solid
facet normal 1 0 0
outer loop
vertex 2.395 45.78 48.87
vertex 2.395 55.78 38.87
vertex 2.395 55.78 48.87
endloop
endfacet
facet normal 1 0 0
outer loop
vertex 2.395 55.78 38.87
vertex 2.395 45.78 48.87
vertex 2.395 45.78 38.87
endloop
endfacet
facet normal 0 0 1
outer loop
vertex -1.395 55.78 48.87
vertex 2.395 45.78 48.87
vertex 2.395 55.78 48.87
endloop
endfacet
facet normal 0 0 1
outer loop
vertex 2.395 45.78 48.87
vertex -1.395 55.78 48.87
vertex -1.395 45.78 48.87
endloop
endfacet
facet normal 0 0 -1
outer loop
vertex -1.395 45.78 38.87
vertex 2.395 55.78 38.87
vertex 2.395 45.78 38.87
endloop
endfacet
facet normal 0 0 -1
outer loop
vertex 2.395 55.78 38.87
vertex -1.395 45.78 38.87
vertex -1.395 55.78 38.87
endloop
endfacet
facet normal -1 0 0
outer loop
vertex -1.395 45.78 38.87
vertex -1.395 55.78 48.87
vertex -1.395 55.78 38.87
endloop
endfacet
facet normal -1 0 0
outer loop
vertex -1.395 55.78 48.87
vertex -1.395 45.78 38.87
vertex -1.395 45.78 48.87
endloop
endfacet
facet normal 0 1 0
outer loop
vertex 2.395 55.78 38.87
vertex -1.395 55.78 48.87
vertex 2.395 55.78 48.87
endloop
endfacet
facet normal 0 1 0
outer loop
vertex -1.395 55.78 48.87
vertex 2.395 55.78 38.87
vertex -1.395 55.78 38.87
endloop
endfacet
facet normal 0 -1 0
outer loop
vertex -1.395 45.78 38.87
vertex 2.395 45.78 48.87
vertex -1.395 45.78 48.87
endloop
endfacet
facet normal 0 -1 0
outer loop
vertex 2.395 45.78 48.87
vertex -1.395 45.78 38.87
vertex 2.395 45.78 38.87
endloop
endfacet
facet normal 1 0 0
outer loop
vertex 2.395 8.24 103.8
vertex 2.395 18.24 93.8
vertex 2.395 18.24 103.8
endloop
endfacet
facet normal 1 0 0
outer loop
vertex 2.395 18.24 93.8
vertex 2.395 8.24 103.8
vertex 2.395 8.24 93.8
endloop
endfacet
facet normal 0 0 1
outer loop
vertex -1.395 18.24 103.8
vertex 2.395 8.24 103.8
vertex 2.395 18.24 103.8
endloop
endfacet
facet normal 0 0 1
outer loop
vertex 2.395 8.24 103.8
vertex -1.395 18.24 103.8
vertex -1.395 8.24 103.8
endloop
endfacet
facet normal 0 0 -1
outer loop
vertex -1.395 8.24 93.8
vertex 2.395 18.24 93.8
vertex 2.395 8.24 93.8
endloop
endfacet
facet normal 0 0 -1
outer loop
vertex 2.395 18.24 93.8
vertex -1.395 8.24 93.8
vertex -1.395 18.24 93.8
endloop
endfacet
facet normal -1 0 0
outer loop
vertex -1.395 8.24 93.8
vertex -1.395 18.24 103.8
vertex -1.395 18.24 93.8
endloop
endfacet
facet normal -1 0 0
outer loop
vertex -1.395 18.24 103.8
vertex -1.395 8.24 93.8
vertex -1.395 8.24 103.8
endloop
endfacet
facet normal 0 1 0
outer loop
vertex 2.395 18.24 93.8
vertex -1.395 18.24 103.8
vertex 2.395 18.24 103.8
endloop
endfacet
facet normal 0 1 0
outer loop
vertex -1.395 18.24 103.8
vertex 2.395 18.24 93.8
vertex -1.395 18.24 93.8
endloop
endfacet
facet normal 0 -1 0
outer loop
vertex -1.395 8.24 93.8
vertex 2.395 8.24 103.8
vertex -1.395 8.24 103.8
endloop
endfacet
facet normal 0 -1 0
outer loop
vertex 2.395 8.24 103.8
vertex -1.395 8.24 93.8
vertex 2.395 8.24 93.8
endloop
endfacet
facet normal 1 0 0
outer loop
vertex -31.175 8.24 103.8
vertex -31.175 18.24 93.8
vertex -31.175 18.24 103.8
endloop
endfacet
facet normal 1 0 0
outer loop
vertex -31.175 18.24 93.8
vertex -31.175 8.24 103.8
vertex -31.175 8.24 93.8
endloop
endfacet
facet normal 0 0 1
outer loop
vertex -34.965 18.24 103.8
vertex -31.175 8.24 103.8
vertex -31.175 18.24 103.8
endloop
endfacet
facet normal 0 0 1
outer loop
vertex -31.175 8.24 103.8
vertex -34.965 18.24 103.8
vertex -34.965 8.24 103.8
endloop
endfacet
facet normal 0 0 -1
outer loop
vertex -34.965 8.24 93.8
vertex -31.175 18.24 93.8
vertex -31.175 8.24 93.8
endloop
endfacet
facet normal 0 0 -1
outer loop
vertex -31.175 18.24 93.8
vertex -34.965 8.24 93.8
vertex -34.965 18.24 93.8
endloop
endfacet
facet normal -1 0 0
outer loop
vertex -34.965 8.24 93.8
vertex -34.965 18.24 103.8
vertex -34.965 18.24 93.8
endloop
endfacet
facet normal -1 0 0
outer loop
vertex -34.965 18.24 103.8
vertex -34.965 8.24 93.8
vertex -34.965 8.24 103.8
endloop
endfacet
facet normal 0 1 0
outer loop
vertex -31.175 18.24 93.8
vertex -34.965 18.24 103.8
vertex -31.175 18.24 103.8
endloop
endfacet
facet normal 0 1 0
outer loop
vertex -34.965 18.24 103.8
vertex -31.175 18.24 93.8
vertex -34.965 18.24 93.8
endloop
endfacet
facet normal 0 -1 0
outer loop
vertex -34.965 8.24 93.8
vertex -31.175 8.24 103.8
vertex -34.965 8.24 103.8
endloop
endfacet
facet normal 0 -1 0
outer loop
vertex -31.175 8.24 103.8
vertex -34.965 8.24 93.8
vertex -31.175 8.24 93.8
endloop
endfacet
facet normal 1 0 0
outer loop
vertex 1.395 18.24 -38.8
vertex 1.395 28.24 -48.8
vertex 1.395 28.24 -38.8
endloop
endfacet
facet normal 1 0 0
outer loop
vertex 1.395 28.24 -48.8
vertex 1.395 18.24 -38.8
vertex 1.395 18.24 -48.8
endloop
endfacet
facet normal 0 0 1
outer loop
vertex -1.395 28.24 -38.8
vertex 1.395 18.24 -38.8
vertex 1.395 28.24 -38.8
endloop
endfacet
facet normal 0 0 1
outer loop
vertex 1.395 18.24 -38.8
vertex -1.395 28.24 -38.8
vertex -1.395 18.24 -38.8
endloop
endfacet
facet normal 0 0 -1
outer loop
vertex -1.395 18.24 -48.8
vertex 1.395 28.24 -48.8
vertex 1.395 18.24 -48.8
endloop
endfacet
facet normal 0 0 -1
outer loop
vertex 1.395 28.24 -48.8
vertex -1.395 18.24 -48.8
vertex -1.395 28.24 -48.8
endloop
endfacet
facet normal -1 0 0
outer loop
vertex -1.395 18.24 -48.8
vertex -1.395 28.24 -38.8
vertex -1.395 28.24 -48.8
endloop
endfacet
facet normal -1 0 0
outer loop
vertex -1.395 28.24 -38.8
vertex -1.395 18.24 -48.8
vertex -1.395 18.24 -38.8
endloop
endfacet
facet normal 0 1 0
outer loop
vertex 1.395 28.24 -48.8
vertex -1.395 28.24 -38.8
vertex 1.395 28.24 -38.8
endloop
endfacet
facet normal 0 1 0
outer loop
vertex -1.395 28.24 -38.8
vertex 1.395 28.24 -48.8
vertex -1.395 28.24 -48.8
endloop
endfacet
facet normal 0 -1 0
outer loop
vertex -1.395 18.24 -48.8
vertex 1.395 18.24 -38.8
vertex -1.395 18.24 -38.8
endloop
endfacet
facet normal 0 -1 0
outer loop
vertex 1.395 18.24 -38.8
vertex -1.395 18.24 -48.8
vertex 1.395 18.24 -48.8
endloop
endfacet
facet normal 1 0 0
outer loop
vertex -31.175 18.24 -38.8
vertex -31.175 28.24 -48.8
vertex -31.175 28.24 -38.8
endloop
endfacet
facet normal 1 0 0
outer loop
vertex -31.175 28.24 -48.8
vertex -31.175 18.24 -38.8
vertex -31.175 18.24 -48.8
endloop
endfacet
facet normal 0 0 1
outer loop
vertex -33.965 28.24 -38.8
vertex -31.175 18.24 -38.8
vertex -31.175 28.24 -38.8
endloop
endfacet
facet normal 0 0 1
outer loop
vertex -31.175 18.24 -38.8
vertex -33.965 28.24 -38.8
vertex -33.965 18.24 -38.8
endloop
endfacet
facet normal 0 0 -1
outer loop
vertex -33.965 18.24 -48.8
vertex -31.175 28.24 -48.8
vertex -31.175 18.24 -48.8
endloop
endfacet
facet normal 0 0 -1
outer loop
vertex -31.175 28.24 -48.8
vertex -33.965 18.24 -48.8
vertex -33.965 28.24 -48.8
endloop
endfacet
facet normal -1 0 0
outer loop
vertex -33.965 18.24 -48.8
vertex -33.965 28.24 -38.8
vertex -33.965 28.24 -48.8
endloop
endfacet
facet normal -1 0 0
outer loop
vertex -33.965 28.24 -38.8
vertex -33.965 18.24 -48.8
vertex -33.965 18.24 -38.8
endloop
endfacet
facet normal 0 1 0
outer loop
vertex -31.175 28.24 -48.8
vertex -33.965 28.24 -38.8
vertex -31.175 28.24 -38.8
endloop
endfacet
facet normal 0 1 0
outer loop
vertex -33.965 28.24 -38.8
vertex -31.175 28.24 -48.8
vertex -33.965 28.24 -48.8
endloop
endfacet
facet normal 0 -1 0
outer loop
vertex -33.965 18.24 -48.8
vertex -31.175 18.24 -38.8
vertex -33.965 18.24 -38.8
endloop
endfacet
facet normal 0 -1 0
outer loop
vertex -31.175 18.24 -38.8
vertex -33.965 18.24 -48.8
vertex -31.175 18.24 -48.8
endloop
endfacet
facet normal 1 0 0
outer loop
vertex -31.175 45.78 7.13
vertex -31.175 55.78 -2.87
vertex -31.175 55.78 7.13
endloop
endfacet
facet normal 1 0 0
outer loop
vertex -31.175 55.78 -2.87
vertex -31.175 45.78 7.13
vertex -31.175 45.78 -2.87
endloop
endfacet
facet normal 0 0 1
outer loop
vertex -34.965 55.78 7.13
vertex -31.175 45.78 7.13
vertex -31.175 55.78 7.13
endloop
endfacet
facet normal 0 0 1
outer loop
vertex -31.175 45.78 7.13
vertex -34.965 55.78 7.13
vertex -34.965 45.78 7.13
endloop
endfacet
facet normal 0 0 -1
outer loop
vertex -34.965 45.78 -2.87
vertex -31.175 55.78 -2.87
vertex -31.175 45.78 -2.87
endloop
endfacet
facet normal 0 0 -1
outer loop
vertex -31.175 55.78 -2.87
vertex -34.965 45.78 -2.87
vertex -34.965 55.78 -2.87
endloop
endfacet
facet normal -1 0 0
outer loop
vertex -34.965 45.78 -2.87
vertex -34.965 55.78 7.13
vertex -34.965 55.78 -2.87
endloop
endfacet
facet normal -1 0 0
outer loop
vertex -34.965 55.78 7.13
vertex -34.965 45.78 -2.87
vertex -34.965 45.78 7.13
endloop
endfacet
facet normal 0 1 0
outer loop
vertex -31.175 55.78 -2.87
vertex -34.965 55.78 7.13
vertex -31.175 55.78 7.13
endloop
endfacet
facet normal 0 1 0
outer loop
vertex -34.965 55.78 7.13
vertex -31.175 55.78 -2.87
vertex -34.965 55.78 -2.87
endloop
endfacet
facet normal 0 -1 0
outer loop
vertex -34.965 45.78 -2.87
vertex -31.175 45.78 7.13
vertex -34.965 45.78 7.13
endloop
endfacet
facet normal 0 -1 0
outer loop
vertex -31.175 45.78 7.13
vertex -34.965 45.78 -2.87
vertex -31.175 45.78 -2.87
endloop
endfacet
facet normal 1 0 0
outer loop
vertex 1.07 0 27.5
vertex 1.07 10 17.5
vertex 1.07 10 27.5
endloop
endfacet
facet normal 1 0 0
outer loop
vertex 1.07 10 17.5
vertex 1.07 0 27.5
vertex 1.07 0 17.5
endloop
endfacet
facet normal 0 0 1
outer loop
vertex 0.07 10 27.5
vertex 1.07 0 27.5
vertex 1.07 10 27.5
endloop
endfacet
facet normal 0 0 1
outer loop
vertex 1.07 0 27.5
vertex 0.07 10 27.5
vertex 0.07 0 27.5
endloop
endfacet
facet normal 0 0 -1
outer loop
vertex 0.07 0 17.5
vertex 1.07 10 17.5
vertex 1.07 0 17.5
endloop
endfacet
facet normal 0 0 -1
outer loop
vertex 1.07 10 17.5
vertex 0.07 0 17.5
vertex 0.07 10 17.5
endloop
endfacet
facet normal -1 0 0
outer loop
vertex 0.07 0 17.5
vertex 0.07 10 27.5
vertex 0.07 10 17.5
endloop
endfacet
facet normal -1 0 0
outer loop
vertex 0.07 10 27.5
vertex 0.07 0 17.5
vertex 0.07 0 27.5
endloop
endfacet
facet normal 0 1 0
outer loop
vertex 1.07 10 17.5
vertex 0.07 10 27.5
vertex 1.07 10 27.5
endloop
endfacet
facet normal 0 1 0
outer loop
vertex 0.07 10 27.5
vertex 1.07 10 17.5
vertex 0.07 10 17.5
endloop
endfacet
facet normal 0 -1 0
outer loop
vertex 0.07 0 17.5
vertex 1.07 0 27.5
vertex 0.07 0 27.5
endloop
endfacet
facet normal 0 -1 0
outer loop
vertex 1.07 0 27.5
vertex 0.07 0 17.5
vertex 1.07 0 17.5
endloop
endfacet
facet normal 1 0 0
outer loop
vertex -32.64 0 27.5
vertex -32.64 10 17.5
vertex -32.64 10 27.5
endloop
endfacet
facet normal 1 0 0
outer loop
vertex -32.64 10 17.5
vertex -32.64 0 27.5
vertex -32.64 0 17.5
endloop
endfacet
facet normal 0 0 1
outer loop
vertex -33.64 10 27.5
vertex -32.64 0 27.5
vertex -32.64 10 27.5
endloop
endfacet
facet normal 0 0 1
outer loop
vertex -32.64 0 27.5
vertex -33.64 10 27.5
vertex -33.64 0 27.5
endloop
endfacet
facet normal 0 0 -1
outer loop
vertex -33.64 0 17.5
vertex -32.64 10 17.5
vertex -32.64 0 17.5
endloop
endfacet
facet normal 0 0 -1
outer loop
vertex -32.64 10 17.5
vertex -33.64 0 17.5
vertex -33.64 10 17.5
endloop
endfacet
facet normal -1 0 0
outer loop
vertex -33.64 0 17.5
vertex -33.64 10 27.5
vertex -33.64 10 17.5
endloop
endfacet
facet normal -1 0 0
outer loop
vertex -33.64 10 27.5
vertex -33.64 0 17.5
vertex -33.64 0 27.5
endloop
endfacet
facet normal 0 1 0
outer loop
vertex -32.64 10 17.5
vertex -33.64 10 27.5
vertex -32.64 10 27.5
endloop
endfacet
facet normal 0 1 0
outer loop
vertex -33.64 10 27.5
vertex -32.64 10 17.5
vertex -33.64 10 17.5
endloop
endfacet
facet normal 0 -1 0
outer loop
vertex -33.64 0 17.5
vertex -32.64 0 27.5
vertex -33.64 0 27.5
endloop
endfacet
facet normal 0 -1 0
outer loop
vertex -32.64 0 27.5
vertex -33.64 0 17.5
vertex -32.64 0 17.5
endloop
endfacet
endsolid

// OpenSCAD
$fa = 12;
$fs = 1.0;

union() {
	color(alpha = 1.0, c = "pink") {
		translate(v = [0.5, 50.78, 43.87]) {
			cube(center = true, size = [3.79, 10, 10]);
		}
	}
	color(alpha = 1.0, c = "pink") {
		translate(v = [0.5, 13.24, 98.8]) {
			cube(center = true, size = [3.79, 10, 10]);
		}
	}
	color(alpha = 1.0, c = "pink") {
		translate(v = [-33.07, 13.24, 98.8]) {
			cube(center = true, size = [3.79, 10, 10]);
		}
	}
	color(alpha = 1.0, c = "pink") {
		translate(v = [0.0, 23.24, -43.8]) {
			cube(center = true, size = [2.79, 10, 10]);
		}
	}
	color(alpha = 1.0, c = "pink") {
		translate(v = [-32.57, 23.24, -43.8]) {
			cube(center = true, size = [2.79, 10, 10]);
		}
	}
	color(alpha = 1.0, c = "pink") {
		translate(v = [-33.07, 50.78, 2.13]) {
			cube(center = true, size = [3.79, 10, 10]);
		}
	}
	color(alpha = 1.0, c = "pink") {
		translate(v = [0.57, 5.0, 22.5]) {
			cube(center = true, size = [1.0, 10.0, 10.0]);
		}
	}
	color(alpha = 1.0, c = "pink") {
		translate(v = [-33.14, 5.0, 22.5]) {
			cube(center = true, size = [1.0, 10.0, 10.0]);
		}
	}
}
